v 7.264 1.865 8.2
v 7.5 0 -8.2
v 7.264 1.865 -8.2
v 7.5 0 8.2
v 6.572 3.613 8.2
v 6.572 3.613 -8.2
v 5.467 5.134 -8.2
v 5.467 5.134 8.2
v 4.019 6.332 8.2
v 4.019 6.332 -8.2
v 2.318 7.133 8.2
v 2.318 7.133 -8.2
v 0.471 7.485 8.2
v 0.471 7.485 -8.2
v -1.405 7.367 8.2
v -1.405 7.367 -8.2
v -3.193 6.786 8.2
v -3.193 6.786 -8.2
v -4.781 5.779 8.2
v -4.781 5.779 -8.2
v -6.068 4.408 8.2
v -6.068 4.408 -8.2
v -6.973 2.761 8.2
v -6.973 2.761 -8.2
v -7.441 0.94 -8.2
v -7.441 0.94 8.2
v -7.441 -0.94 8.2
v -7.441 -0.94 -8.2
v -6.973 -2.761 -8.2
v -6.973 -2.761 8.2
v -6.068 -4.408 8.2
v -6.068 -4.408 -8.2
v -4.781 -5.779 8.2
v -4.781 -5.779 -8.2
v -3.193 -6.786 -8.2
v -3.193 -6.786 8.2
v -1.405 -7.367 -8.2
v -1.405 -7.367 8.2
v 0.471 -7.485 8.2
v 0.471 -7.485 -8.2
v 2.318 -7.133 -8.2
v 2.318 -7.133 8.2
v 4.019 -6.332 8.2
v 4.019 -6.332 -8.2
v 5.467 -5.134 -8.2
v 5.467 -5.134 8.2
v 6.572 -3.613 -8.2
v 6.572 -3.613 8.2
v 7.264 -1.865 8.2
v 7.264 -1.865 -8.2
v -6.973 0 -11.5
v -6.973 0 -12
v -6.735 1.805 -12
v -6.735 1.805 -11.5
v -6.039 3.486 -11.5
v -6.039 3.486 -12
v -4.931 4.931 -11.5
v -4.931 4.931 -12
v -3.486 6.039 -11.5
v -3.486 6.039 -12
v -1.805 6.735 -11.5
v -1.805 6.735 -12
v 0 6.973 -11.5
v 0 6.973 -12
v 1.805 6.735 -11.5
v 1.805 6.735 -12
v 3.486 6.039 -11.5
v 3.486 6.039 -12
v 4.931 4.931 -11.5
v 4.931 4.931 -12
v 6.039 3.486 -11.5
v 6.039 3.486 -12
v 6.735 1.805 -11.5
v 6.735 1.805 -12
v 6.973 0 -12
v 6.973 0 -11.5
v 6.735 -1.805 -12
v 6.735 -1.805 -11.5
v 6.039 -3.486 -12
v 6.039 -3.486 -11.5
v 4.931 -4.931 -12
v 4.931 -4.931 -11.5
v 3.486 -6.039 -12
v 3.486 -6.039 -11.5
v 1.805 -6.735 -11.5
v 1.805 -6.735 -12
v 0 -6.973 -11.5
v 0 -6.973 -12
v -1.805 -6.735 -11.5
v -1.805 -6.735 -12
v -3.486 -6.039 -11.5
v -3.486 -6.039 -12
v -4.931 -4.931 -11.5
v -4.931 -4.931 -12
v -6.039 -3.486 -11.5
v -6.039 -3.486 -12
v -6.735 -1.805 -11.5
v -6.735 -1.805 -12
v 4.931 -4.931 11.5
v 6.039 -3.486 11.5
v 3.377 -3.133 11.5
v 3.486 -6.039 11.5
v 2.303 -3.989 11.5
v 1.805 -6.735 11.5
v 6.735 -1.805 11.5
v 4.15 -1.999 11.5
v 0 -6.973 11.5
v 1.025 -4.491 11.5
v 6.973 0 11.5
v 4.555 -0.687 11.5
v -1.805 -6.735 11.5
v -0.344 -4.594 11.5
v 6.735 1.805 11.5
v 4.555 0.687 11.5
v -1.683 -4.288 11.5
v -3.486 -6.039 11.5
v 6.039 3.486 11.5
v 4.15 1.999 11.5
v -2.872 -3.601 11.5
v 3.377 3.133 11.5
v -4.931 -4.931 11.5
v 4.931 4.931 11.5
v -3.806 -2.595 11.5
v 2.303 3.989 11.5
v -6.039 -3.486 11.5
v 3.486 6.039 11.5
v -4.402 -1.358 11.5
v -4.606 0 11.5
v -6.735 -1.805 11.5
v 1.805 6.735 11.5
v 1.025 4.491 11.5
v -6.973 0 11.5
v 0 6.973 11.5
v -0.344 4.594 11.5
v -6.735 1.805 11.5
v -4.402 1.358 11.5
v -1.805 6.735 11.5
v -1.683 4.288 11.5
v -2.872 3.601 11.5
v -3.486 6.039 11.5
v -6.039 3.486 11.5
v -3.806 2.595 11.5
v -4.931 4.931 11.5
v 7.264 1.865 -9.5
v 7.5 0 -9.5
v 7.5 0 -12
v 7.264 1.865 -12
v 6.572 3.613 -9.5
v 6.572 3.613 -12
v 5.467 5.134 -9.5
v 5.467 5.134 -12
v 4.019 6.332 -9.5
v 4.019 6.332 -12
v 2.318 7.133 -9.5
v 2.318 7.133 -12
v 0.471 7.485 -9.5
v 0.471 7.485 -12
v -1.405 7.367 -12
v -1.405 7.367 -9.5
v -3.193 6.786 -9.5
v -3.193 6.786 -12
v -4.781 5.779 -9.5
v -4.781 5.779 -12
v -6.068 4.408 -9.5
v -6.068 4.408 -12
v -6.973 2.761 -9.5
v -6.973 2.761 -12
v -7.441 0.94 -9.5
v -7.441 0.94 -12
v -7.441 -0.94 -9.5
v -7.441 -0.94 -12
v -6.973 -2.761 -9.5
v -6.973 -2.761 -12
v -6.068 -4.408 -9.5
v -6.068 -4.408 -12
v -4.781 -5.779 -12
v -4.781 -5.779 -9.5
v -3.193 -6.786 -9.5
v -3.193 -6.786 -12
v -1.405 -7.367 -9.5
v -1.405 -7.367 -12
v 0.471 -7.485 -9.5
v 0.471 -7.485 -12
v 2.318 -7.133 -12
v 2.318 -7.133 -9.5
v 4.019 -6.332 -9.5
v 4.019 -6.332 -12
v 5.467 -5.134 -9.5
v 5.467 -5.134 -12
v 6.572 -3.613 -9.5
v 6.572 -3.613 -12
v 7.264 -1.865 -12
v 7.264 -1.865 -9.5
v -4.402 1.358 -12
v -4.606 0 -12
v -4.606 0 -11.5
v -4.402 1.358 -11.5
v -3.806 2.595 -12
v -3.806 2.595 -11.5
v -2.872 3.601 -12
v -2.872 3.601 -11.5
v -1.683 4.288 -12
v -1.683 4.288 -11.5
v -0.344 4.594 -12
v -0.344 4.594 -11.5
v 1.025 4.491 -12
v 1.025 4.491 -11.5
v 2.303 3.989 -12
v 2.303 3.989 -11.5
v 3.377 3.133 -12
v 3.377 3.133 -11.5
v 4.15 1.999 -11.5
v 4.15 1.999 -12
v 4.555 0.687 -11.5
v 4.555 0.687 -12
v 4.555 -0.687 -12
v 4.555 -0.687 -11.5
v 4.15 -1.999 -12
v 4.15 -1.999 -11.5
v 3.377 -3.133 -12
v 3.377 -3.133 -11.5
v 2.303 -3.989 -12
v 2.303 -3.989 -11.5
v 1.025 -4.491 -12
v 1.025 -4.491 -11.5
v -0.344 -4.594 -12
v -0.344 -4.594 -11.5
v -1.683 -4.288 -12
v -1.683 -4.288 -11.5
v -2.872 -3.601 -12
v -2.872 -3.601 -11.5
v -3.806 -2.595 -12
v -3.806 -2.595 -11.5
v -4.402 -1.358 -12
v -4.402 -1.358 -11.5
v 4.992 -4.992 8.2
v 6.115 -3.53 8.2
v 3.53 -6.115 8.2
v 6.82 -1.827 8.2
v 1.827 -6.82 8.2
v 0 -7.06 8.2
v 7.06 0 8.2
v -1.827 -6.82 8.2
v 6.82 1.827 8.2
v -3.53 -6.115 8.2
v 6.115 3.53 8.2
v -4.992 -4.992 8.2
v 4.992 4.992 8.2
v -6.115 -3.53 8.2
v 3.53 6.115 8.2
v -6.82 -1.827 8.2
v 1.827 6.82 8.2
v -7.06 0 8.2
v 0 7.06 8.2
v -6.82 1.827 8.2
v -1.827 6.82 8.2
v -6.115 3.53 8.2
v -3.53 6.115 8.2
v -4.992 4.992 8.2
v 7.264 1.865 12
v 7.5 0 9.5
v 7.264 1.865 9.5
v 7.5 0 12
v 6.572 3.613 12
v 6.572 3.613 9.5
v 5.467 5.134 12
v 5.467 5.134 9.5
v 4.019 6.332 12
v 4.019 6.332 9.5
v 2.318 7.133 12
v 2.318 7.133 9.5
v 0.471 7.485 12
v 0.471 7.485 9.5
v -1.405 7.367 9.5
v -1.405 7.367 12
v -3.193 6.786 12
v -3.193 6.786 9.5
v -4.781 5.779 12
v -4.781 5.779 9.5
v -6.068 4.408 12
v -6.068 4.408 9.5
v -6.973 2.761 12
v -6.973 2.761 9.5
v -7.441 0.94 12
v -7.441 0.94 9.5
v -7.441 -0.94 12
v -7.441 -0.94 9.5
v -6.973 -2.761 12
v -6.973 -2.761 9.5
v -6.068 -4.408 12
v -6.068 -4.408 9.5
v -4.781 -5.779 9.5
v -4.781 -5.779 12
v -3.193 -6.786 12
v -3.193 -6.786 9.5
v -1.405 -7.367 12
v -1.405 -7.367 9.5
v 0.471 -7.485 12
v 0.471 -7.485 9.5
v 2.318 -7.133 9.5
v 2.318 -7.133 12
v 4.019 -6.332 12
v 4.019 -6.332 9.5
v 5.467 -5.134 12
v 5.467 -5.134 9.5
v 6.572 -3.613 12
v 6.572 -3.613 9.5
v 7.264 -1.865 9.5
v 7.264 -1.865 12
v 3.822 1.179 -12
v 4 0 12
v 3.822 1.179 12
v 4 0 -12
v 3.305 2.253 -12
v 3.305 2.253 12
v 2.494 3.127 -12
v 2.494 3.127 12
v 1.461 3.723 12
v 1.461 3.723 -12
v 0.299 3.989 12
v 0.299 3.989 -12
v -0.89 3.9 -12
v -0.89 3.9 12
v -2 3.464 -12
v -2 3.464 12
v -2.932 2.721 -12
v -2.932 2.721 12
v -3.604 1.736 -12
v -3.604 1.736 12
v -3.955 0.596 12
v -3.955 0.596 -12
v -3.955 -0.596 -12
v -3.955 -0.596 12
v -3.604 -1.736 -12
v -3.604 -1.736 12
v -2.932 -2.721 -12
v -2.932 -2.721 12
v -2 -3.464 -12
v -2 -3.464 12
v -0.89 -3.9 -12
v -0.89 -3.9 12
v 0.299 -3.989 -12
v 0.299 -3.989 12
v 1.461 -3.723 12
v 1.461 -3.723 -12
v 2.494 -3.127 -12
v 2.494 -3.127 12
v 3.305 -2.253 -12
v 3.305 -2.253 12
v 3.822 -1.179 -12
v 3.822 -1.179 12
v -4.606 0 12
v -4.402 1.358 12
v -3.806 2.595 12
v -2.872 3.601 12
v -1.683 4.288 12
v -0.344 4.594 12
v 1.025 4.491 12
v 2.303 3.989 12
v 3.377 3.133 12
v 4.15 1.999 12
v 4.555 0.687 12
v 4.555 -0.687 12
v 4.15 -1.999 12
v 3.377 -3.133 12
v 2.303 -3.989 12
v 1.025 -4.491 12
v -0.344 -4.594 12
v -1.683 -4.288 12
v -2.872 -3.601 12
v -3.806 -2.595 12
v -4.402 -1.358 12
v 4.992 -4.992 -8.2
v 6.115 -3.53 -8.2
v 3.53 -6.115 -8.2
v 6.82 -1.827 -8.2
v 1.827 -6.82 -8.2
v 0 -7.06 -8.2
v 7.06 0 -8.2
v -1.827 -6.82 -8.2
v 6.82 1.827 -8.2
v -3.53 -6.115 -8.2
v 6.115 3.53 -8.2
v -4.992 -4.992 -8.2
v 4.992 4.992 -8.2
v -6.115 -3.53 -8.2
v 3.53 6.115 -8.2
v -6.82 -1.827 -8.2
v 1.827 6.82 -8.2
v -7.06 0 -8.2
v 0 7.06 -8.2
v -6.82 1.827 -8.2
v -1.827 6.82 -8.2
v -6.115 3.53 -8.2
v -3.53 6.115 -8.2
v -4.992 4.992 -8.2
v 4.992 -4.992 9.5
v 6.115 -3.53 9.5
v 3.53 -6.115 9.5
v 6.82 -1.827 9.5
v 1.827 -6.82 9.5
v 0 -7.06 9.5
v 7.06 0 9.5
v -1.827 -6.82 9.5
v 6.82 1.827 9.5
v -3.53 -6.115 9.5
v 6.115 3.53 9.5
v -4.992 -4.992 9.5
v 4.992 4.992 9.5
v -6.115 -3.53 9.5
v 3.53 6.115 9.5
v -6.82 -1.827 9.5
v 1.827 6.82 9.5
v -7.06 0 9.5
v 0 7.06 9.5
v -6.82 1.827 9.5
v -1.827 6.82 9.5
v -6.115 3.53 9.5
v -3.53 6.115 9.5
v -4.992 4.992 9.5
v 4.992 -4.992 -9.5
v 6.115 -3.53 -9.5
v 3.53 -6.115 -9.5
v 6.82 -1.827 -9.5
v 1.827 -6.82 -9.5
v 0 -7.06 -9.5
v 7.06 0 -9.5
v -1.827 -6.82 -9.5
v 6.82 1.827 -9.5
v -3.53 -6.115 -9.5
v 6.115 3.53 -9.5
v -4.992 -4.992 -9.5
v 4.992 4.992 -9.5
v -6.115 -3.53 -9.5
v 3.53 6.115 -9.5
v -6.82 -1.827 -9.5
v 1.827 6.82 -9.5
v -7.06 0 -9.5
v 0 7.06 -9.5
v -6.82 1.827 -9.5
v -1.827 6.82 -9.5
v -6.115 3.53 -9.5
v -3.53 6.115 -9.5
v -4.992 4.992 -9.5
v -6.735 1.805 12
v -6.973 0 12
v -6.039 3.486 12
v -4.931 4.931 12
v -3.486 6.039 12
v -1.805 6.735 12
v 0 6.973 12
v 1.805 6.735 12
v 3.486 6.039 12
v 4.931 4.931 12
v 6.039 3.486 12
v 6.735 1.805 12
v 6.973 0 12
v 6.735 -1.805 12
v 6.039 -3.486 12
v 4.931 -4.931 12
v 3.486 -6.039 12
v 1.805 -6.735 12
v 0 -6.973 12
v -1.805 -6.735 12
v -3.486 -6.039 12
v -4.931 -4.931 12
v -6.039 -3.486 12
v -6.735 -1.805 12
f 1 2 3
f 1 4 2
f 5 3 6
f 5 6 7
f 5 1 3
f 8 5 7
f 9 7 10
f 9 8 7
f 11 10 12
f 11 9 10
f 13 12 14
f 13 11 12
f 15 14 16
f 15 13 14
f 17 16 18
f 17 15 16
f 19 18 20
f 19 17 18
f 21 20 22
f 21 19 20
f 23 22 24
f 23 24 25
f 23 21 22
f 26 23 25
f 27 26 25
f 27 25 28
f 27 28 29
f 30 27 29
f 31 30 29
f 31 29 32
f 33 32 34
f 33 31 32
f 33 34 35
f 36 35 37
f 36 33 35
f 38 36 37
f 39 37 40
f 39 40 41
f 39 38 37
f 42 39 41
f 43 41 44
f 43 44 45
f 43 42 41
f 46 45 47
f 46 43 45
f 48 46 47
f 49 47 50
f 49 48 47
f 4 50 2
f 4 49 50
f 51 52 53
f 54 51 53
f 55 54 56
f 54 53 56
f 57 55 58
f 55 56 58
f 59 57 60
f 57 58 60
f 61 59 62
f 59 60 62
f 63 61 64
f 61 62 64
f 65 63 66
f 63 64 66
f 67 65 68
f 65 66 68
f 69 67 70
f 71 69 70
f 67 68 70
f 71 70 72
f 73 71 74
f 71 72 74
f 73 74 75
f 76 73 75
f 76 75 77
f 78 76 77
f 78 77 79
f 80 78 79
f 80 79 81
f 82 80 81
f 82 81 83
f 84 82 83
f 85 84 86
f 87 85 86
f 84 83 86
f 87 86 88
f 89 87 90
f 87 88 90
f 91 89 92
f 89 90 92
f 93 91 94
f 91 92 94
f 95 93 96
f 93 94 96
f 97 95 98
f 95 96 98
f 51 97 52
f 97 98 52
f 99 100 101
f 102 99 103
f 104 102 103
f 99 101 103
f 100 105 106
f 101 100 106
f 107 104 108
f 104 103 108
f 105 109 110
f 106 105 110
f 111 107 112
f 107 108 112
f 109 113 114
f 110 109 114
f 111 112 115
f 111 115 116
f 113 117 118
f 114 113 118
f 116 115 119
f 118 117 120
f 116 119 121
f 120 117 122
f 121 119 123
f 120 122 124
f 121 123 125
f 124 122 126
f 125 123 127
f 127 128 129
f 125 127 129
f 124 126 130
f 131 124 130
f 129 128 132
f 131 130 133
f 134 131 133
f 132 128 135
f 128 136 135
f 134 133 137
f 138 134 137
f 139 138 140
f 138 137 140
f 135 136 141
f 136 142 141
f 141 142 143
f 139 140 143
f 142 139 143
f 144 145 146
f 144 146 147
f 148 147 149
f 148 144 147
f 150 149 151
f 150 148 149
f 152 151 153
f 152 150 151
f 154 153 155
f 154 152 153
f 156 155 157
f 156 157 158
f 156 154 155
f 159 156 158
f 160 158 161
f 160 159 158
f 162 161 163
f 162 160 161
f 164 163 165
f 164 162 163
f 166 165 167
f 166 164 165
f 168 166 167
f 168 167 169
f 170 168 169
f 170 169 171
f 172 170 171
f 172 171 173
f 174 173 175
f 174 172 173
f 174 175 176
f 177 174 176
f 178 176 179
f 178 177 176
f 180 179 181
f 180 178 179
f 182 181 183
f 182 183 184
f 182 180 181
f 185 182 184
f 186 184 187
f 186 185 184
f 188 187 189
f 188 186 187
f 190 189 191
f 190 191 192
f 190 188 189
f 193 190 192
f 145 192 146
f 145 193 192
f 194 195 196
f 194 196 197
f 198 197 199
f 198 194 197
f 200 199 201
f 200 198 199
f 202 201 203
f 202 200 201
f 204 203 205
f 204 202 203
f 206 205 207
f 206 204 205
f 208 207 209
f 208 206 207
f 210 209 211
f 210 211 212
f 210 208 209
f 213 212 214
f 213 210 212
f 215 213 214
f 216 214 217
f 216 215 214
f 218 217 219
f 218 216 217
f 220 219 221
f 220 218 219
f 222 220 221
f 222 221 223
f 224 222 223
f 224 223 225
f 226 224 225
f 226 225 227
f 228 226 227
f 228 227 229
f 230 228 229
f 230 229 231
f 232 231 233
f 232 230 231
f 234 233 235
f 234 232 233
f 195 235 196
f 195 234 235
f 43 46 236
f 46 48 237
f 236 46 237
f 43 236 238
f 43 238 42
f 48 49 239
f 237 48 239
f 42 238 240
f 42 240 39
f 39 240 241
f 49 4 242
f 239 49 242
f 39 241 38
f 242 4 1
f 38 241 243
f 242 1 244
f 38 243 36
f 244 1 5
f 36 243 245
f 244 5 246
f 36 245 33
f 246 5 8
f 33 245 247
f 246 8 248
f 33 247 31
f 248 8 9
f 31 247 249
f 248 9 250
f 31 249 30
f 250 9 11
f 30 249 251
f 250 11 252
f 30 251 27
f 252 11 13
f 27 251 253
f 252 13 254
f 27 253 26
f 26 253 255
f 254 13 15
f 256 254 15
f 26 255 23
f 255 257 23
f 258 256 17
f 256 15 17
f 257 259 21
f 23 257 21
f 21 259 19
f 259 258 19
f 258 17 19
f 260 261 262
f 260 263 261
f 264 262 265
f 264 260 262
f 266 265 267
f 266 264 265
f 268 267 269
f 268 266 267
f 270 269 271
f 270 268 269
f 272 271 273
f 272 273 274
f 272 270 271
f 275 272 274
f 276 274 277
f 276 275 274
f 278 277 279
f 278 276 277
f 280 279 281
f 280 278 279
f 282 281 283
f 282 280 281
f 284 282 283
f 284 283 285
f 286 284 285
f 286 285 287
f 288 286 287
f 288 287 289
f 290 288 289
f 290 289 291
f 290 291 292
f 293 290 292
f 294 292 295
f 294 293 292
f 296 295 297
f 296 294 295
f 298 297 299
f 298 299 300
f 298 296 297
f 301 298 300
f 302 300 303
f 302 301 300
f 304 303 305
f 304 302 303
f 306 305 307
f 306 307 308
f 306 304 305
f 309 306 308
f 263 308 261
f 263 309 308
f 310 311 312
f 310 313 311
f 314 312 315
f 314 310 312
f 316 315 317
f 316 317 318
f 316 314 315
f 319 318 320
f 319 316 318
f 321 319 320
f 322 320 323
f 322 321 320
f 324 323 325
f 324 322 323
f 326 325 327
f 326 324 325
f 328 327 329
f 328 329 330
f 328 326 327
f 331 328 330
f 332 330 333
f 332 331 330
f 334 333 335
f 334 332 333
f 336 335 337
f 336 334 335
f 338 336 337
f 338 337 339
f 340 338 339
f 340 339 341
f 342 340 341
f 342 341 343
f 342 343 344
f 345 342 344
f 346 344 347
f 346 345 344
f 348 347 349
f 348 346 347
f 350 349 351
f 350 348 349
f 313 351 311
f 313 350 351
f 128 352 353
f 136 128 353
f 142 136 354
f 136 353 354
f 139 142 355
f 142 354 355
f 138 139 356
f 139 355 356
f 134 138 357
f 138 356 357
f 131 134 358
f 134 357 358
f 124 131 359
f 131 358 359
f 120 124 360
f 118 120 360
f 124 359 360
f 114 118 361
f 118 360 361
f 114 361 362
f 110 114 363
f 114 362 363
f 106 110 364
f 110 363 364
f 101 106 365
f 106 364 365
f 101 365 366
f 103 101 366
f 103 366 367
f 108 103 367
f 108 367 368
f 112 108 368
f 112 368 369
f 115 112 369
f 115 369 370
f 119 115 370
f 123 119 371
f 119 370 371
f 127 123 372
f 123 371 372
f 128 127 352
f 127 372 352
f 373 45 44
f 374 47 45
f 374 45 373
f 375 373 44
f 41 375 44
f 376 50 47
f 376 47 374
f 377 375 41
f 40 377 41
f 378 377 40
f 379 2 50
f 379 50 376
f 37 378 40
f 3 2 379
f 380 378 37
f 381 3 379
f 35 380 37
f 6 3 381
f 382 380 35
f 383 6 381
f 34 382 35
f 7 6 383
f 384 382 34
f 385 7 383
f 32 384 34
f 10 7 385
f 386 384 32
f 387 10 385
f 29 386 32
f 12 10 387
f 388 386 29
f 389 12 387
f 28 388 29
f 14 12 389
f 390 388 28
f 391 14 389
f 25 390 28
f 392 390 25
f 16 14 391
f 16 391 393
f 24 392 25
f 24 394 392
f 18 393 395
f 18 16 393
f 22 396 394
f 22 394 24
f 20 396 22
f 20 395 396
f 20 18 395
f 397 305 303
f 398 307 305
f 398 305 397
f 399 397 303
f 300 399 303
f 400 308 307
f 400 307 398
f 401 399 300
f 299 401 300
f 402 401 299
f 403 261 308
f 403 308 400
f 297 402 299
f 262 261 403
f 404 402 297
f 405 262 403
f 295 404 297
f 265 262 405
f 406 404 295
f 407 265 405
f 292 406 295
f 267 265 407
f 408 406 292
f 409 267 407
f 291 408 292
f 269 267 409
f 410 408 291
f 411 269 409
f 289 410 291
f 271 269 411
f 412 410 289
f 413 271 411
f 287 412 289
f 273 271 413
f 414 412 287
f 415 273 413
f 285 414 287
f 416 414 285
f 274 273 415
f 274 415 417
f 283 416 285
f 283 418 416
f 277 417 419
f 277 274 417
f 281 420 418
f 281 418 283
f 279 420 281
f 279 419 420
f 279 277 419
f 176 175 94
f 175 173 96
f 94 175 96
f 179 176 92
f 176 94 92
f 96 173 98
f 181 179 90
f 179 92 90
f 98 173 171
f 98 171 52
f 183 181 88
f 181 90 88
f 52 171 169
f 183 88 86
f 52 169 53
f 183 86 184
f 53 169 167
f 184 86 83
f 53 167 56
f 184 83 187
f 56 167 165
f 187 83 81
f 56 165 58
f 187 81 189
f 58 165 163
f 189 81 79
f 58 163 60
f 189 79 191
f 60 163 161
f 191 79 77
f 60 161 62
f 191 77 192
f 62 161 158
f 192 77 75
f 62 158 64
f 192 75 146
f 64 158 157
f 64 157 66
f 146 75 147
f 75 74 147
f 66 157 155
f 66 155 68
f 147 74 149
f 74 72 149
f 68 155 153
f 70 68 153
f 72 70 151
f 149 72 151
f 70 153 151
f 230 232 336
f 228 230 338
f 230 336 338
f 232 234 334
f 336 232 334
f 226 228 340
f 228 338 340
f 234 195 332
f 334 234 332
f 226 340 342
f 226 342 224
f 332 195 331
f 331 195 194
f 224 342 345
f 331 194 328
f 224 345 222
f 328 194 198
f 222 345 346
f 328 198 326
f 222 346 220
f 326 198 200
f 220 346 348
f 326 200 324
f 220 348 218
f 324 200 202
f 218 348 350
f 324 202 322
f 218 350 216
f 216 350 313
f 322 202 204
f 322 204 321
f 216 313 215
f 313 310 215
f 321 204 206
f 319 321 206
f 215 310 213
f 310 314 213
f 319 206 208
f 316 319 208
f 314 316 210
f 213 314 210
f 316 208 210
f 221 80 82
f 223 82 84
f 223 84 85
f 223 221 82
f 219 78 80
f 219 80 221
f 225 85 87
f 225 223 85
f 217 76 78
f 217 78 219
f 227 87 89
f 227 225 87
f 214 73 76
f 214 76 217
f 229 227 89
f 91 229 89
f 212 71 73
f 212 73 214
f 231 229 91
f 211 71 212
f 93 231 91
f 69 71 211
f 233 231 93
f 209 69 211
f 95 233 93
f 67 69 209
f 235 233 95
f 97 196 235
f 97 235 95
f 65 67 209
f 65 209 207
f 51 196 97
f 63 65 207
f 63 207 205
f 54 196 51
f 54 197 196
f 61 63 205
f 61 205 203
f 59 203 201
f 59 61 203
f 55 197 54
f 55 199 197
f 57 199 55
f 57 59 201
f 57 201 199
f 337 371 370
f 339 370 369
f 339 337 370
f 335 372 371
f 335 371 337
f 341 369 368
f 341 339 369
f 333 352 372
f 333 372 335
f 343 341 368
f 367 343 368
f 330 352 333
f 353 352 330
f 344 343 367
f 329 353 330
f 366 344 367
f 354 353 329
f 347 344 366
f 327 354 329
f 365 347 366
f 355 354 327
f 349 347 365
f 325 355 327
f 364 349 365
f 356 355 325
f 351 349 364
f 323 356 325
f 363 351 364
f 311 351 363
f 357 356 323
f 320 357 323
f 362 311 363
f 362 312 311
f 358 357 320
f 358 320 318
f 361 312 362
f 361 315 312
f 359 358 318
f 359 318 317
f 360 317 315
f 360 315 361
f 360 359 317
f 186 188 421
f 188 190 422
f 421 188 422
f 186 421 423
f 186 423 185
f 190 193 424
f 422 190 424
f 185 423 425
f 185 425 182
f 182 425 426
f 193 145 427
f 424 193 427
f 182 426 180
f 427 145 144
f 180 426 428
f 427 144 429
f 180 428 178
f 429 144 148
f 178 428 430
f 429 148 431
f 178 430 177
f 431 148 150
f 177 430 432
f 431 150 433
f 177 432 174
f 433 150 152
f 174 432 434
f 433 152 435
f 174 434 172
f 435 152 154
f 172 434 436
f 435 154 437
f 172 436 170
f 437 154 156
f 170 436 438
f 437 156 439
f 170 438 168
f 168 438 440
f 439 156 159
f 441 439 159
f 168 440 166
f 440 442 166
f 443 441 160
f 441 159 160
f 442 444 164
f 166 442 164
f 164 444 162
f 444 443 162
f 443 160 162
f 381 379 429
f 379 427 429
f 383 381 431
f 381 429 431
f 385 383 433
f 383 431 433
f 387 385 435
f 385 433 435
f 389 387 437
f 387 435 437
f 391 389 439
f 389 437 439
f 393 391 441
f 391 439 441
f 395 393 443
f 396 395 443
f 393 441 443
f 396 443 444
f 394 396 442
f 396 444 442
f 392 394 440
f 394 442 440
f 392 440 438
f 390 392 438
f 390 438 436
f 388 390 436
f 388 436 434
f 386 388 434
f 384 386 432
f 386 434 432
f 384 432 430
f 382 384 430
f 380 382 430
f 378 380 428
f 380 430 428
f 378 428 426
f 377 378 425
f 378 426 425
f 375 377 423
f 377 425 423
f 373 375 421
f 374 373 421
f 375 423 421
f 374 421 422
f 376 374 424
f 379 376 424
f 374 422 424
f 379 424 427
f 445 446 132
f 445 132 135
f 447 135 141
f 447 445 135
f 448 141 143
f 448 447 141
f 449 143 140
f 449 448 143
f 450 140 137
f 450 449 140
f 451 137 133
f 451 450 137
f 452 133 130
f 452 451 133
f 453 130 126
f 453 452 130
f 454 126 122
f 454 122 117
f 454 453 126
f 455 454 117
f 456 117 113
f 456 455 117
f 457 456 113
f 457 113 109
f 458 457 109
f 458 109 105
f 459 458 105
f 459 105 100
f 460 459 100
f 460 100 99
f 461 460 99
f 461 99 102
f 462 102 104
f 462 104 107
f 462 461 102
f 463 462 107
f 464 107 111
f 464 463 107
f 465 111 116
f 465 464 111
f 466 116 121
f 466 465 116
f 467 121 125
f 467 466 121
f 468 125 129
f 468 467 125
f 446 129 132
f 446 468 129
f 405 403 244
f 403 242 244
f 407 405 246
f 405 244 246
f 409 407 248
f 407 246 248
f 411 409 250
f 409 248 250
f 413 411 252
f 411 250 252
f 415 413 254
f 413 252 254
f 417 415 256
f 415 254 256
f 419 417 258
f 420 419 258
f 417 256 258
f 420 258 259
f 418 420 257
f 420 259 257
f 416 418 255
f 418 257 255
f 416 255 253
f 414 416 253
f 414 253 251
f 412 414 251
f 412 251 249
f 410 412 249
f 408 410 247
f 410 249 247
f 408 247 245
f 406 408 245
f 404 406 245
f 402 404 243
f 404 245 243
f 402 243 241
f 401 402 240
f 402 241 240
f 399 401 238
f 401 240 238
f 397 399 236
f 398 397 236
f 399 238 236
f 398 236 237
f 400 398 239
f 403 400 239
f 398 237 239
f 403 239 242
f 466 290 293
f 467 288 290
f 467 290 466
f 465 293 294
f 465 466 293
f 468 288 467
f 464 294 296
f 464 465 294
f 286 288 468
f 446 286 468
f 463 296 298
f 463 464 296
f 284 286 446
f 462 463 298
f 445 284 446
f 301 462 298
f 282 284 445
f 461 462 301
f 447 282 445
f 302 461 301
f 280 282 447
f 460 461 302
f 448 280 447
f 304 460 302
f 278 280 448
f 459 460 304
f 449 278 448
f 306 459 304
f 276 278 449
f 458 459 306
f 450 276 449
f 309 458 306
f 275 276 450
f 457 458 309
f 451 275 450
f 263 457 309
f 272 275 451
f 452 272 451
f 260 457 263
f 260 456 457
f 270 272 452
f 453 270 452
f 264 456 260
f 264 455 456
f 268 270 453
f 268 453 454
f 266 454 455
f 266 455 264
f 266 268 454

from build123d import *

# Parameters (mm, degrees)
SKETCH1_R           = 7.5
SKETCH1_R_2         = 4
BOSS_EXTRUDE1_DEPTH = 12
SKETCH2_W           = 0.934125578
SKETCH2_H           = 1.3
SKETCH3_R           = 6.972941291
SKETCH3_R_2         = 4.606383091
CUT_EXTRUDE1_DEPTH  = 0.5


with BuildPart() as part:
    # Sketch1 → Boss-Extrude1 (new body, symmetric)
    with BuildSketch(Plane.XY):
        Circle(SKETCH1_R)
        Circle(SKETCH1_R_2, mode=Mode.SUBTRACT)
    extrude(amount=BOSS_EXTRUDE1_DEPTH, both=True)

    # Sketch2 → Cut-Revolve1 (revolve, cut)
    with BuildSketch(Plane(origin=(0, 0, 0), x_dir=(1, 0, 0), z_dir=(0, 1, 0))):
        with Locations((7.527516863, -8.85)):
            Rectangle(SKETCH2_W, SKETCH2_H)
        with Locations((7.527516863, 8.85)):
            Rectangle(SKETCH2_W, SKETCH2_H)
    revolve(axis=Axis((0, 0, -13.646970123), (0, 0, 1)), mode=Mode.SUBTRACT)

    # Sketch3 → Cut-Extrude1 (cut)
    with BuildSketch(Plane(origin=(0, 0, -12), x_dir=(-1, 0, 0), z_dir=(0, 0, -1))):
        Circle(SKETCH3_R)
        Circle(SKETCH3_R_2, mode=Mode.SUBTRACT)
    cut_extrude1 = extrude(amount=-CUT_EXTRUDE1_DEPTH, mode=Mode.SUBTRACT)

    # Mirror1: Cut-Extrude1 across plane
    add(cut_extrude1.mirror(Plane.XY), mode=Mode.SUBTRACT)


solid = part.part
